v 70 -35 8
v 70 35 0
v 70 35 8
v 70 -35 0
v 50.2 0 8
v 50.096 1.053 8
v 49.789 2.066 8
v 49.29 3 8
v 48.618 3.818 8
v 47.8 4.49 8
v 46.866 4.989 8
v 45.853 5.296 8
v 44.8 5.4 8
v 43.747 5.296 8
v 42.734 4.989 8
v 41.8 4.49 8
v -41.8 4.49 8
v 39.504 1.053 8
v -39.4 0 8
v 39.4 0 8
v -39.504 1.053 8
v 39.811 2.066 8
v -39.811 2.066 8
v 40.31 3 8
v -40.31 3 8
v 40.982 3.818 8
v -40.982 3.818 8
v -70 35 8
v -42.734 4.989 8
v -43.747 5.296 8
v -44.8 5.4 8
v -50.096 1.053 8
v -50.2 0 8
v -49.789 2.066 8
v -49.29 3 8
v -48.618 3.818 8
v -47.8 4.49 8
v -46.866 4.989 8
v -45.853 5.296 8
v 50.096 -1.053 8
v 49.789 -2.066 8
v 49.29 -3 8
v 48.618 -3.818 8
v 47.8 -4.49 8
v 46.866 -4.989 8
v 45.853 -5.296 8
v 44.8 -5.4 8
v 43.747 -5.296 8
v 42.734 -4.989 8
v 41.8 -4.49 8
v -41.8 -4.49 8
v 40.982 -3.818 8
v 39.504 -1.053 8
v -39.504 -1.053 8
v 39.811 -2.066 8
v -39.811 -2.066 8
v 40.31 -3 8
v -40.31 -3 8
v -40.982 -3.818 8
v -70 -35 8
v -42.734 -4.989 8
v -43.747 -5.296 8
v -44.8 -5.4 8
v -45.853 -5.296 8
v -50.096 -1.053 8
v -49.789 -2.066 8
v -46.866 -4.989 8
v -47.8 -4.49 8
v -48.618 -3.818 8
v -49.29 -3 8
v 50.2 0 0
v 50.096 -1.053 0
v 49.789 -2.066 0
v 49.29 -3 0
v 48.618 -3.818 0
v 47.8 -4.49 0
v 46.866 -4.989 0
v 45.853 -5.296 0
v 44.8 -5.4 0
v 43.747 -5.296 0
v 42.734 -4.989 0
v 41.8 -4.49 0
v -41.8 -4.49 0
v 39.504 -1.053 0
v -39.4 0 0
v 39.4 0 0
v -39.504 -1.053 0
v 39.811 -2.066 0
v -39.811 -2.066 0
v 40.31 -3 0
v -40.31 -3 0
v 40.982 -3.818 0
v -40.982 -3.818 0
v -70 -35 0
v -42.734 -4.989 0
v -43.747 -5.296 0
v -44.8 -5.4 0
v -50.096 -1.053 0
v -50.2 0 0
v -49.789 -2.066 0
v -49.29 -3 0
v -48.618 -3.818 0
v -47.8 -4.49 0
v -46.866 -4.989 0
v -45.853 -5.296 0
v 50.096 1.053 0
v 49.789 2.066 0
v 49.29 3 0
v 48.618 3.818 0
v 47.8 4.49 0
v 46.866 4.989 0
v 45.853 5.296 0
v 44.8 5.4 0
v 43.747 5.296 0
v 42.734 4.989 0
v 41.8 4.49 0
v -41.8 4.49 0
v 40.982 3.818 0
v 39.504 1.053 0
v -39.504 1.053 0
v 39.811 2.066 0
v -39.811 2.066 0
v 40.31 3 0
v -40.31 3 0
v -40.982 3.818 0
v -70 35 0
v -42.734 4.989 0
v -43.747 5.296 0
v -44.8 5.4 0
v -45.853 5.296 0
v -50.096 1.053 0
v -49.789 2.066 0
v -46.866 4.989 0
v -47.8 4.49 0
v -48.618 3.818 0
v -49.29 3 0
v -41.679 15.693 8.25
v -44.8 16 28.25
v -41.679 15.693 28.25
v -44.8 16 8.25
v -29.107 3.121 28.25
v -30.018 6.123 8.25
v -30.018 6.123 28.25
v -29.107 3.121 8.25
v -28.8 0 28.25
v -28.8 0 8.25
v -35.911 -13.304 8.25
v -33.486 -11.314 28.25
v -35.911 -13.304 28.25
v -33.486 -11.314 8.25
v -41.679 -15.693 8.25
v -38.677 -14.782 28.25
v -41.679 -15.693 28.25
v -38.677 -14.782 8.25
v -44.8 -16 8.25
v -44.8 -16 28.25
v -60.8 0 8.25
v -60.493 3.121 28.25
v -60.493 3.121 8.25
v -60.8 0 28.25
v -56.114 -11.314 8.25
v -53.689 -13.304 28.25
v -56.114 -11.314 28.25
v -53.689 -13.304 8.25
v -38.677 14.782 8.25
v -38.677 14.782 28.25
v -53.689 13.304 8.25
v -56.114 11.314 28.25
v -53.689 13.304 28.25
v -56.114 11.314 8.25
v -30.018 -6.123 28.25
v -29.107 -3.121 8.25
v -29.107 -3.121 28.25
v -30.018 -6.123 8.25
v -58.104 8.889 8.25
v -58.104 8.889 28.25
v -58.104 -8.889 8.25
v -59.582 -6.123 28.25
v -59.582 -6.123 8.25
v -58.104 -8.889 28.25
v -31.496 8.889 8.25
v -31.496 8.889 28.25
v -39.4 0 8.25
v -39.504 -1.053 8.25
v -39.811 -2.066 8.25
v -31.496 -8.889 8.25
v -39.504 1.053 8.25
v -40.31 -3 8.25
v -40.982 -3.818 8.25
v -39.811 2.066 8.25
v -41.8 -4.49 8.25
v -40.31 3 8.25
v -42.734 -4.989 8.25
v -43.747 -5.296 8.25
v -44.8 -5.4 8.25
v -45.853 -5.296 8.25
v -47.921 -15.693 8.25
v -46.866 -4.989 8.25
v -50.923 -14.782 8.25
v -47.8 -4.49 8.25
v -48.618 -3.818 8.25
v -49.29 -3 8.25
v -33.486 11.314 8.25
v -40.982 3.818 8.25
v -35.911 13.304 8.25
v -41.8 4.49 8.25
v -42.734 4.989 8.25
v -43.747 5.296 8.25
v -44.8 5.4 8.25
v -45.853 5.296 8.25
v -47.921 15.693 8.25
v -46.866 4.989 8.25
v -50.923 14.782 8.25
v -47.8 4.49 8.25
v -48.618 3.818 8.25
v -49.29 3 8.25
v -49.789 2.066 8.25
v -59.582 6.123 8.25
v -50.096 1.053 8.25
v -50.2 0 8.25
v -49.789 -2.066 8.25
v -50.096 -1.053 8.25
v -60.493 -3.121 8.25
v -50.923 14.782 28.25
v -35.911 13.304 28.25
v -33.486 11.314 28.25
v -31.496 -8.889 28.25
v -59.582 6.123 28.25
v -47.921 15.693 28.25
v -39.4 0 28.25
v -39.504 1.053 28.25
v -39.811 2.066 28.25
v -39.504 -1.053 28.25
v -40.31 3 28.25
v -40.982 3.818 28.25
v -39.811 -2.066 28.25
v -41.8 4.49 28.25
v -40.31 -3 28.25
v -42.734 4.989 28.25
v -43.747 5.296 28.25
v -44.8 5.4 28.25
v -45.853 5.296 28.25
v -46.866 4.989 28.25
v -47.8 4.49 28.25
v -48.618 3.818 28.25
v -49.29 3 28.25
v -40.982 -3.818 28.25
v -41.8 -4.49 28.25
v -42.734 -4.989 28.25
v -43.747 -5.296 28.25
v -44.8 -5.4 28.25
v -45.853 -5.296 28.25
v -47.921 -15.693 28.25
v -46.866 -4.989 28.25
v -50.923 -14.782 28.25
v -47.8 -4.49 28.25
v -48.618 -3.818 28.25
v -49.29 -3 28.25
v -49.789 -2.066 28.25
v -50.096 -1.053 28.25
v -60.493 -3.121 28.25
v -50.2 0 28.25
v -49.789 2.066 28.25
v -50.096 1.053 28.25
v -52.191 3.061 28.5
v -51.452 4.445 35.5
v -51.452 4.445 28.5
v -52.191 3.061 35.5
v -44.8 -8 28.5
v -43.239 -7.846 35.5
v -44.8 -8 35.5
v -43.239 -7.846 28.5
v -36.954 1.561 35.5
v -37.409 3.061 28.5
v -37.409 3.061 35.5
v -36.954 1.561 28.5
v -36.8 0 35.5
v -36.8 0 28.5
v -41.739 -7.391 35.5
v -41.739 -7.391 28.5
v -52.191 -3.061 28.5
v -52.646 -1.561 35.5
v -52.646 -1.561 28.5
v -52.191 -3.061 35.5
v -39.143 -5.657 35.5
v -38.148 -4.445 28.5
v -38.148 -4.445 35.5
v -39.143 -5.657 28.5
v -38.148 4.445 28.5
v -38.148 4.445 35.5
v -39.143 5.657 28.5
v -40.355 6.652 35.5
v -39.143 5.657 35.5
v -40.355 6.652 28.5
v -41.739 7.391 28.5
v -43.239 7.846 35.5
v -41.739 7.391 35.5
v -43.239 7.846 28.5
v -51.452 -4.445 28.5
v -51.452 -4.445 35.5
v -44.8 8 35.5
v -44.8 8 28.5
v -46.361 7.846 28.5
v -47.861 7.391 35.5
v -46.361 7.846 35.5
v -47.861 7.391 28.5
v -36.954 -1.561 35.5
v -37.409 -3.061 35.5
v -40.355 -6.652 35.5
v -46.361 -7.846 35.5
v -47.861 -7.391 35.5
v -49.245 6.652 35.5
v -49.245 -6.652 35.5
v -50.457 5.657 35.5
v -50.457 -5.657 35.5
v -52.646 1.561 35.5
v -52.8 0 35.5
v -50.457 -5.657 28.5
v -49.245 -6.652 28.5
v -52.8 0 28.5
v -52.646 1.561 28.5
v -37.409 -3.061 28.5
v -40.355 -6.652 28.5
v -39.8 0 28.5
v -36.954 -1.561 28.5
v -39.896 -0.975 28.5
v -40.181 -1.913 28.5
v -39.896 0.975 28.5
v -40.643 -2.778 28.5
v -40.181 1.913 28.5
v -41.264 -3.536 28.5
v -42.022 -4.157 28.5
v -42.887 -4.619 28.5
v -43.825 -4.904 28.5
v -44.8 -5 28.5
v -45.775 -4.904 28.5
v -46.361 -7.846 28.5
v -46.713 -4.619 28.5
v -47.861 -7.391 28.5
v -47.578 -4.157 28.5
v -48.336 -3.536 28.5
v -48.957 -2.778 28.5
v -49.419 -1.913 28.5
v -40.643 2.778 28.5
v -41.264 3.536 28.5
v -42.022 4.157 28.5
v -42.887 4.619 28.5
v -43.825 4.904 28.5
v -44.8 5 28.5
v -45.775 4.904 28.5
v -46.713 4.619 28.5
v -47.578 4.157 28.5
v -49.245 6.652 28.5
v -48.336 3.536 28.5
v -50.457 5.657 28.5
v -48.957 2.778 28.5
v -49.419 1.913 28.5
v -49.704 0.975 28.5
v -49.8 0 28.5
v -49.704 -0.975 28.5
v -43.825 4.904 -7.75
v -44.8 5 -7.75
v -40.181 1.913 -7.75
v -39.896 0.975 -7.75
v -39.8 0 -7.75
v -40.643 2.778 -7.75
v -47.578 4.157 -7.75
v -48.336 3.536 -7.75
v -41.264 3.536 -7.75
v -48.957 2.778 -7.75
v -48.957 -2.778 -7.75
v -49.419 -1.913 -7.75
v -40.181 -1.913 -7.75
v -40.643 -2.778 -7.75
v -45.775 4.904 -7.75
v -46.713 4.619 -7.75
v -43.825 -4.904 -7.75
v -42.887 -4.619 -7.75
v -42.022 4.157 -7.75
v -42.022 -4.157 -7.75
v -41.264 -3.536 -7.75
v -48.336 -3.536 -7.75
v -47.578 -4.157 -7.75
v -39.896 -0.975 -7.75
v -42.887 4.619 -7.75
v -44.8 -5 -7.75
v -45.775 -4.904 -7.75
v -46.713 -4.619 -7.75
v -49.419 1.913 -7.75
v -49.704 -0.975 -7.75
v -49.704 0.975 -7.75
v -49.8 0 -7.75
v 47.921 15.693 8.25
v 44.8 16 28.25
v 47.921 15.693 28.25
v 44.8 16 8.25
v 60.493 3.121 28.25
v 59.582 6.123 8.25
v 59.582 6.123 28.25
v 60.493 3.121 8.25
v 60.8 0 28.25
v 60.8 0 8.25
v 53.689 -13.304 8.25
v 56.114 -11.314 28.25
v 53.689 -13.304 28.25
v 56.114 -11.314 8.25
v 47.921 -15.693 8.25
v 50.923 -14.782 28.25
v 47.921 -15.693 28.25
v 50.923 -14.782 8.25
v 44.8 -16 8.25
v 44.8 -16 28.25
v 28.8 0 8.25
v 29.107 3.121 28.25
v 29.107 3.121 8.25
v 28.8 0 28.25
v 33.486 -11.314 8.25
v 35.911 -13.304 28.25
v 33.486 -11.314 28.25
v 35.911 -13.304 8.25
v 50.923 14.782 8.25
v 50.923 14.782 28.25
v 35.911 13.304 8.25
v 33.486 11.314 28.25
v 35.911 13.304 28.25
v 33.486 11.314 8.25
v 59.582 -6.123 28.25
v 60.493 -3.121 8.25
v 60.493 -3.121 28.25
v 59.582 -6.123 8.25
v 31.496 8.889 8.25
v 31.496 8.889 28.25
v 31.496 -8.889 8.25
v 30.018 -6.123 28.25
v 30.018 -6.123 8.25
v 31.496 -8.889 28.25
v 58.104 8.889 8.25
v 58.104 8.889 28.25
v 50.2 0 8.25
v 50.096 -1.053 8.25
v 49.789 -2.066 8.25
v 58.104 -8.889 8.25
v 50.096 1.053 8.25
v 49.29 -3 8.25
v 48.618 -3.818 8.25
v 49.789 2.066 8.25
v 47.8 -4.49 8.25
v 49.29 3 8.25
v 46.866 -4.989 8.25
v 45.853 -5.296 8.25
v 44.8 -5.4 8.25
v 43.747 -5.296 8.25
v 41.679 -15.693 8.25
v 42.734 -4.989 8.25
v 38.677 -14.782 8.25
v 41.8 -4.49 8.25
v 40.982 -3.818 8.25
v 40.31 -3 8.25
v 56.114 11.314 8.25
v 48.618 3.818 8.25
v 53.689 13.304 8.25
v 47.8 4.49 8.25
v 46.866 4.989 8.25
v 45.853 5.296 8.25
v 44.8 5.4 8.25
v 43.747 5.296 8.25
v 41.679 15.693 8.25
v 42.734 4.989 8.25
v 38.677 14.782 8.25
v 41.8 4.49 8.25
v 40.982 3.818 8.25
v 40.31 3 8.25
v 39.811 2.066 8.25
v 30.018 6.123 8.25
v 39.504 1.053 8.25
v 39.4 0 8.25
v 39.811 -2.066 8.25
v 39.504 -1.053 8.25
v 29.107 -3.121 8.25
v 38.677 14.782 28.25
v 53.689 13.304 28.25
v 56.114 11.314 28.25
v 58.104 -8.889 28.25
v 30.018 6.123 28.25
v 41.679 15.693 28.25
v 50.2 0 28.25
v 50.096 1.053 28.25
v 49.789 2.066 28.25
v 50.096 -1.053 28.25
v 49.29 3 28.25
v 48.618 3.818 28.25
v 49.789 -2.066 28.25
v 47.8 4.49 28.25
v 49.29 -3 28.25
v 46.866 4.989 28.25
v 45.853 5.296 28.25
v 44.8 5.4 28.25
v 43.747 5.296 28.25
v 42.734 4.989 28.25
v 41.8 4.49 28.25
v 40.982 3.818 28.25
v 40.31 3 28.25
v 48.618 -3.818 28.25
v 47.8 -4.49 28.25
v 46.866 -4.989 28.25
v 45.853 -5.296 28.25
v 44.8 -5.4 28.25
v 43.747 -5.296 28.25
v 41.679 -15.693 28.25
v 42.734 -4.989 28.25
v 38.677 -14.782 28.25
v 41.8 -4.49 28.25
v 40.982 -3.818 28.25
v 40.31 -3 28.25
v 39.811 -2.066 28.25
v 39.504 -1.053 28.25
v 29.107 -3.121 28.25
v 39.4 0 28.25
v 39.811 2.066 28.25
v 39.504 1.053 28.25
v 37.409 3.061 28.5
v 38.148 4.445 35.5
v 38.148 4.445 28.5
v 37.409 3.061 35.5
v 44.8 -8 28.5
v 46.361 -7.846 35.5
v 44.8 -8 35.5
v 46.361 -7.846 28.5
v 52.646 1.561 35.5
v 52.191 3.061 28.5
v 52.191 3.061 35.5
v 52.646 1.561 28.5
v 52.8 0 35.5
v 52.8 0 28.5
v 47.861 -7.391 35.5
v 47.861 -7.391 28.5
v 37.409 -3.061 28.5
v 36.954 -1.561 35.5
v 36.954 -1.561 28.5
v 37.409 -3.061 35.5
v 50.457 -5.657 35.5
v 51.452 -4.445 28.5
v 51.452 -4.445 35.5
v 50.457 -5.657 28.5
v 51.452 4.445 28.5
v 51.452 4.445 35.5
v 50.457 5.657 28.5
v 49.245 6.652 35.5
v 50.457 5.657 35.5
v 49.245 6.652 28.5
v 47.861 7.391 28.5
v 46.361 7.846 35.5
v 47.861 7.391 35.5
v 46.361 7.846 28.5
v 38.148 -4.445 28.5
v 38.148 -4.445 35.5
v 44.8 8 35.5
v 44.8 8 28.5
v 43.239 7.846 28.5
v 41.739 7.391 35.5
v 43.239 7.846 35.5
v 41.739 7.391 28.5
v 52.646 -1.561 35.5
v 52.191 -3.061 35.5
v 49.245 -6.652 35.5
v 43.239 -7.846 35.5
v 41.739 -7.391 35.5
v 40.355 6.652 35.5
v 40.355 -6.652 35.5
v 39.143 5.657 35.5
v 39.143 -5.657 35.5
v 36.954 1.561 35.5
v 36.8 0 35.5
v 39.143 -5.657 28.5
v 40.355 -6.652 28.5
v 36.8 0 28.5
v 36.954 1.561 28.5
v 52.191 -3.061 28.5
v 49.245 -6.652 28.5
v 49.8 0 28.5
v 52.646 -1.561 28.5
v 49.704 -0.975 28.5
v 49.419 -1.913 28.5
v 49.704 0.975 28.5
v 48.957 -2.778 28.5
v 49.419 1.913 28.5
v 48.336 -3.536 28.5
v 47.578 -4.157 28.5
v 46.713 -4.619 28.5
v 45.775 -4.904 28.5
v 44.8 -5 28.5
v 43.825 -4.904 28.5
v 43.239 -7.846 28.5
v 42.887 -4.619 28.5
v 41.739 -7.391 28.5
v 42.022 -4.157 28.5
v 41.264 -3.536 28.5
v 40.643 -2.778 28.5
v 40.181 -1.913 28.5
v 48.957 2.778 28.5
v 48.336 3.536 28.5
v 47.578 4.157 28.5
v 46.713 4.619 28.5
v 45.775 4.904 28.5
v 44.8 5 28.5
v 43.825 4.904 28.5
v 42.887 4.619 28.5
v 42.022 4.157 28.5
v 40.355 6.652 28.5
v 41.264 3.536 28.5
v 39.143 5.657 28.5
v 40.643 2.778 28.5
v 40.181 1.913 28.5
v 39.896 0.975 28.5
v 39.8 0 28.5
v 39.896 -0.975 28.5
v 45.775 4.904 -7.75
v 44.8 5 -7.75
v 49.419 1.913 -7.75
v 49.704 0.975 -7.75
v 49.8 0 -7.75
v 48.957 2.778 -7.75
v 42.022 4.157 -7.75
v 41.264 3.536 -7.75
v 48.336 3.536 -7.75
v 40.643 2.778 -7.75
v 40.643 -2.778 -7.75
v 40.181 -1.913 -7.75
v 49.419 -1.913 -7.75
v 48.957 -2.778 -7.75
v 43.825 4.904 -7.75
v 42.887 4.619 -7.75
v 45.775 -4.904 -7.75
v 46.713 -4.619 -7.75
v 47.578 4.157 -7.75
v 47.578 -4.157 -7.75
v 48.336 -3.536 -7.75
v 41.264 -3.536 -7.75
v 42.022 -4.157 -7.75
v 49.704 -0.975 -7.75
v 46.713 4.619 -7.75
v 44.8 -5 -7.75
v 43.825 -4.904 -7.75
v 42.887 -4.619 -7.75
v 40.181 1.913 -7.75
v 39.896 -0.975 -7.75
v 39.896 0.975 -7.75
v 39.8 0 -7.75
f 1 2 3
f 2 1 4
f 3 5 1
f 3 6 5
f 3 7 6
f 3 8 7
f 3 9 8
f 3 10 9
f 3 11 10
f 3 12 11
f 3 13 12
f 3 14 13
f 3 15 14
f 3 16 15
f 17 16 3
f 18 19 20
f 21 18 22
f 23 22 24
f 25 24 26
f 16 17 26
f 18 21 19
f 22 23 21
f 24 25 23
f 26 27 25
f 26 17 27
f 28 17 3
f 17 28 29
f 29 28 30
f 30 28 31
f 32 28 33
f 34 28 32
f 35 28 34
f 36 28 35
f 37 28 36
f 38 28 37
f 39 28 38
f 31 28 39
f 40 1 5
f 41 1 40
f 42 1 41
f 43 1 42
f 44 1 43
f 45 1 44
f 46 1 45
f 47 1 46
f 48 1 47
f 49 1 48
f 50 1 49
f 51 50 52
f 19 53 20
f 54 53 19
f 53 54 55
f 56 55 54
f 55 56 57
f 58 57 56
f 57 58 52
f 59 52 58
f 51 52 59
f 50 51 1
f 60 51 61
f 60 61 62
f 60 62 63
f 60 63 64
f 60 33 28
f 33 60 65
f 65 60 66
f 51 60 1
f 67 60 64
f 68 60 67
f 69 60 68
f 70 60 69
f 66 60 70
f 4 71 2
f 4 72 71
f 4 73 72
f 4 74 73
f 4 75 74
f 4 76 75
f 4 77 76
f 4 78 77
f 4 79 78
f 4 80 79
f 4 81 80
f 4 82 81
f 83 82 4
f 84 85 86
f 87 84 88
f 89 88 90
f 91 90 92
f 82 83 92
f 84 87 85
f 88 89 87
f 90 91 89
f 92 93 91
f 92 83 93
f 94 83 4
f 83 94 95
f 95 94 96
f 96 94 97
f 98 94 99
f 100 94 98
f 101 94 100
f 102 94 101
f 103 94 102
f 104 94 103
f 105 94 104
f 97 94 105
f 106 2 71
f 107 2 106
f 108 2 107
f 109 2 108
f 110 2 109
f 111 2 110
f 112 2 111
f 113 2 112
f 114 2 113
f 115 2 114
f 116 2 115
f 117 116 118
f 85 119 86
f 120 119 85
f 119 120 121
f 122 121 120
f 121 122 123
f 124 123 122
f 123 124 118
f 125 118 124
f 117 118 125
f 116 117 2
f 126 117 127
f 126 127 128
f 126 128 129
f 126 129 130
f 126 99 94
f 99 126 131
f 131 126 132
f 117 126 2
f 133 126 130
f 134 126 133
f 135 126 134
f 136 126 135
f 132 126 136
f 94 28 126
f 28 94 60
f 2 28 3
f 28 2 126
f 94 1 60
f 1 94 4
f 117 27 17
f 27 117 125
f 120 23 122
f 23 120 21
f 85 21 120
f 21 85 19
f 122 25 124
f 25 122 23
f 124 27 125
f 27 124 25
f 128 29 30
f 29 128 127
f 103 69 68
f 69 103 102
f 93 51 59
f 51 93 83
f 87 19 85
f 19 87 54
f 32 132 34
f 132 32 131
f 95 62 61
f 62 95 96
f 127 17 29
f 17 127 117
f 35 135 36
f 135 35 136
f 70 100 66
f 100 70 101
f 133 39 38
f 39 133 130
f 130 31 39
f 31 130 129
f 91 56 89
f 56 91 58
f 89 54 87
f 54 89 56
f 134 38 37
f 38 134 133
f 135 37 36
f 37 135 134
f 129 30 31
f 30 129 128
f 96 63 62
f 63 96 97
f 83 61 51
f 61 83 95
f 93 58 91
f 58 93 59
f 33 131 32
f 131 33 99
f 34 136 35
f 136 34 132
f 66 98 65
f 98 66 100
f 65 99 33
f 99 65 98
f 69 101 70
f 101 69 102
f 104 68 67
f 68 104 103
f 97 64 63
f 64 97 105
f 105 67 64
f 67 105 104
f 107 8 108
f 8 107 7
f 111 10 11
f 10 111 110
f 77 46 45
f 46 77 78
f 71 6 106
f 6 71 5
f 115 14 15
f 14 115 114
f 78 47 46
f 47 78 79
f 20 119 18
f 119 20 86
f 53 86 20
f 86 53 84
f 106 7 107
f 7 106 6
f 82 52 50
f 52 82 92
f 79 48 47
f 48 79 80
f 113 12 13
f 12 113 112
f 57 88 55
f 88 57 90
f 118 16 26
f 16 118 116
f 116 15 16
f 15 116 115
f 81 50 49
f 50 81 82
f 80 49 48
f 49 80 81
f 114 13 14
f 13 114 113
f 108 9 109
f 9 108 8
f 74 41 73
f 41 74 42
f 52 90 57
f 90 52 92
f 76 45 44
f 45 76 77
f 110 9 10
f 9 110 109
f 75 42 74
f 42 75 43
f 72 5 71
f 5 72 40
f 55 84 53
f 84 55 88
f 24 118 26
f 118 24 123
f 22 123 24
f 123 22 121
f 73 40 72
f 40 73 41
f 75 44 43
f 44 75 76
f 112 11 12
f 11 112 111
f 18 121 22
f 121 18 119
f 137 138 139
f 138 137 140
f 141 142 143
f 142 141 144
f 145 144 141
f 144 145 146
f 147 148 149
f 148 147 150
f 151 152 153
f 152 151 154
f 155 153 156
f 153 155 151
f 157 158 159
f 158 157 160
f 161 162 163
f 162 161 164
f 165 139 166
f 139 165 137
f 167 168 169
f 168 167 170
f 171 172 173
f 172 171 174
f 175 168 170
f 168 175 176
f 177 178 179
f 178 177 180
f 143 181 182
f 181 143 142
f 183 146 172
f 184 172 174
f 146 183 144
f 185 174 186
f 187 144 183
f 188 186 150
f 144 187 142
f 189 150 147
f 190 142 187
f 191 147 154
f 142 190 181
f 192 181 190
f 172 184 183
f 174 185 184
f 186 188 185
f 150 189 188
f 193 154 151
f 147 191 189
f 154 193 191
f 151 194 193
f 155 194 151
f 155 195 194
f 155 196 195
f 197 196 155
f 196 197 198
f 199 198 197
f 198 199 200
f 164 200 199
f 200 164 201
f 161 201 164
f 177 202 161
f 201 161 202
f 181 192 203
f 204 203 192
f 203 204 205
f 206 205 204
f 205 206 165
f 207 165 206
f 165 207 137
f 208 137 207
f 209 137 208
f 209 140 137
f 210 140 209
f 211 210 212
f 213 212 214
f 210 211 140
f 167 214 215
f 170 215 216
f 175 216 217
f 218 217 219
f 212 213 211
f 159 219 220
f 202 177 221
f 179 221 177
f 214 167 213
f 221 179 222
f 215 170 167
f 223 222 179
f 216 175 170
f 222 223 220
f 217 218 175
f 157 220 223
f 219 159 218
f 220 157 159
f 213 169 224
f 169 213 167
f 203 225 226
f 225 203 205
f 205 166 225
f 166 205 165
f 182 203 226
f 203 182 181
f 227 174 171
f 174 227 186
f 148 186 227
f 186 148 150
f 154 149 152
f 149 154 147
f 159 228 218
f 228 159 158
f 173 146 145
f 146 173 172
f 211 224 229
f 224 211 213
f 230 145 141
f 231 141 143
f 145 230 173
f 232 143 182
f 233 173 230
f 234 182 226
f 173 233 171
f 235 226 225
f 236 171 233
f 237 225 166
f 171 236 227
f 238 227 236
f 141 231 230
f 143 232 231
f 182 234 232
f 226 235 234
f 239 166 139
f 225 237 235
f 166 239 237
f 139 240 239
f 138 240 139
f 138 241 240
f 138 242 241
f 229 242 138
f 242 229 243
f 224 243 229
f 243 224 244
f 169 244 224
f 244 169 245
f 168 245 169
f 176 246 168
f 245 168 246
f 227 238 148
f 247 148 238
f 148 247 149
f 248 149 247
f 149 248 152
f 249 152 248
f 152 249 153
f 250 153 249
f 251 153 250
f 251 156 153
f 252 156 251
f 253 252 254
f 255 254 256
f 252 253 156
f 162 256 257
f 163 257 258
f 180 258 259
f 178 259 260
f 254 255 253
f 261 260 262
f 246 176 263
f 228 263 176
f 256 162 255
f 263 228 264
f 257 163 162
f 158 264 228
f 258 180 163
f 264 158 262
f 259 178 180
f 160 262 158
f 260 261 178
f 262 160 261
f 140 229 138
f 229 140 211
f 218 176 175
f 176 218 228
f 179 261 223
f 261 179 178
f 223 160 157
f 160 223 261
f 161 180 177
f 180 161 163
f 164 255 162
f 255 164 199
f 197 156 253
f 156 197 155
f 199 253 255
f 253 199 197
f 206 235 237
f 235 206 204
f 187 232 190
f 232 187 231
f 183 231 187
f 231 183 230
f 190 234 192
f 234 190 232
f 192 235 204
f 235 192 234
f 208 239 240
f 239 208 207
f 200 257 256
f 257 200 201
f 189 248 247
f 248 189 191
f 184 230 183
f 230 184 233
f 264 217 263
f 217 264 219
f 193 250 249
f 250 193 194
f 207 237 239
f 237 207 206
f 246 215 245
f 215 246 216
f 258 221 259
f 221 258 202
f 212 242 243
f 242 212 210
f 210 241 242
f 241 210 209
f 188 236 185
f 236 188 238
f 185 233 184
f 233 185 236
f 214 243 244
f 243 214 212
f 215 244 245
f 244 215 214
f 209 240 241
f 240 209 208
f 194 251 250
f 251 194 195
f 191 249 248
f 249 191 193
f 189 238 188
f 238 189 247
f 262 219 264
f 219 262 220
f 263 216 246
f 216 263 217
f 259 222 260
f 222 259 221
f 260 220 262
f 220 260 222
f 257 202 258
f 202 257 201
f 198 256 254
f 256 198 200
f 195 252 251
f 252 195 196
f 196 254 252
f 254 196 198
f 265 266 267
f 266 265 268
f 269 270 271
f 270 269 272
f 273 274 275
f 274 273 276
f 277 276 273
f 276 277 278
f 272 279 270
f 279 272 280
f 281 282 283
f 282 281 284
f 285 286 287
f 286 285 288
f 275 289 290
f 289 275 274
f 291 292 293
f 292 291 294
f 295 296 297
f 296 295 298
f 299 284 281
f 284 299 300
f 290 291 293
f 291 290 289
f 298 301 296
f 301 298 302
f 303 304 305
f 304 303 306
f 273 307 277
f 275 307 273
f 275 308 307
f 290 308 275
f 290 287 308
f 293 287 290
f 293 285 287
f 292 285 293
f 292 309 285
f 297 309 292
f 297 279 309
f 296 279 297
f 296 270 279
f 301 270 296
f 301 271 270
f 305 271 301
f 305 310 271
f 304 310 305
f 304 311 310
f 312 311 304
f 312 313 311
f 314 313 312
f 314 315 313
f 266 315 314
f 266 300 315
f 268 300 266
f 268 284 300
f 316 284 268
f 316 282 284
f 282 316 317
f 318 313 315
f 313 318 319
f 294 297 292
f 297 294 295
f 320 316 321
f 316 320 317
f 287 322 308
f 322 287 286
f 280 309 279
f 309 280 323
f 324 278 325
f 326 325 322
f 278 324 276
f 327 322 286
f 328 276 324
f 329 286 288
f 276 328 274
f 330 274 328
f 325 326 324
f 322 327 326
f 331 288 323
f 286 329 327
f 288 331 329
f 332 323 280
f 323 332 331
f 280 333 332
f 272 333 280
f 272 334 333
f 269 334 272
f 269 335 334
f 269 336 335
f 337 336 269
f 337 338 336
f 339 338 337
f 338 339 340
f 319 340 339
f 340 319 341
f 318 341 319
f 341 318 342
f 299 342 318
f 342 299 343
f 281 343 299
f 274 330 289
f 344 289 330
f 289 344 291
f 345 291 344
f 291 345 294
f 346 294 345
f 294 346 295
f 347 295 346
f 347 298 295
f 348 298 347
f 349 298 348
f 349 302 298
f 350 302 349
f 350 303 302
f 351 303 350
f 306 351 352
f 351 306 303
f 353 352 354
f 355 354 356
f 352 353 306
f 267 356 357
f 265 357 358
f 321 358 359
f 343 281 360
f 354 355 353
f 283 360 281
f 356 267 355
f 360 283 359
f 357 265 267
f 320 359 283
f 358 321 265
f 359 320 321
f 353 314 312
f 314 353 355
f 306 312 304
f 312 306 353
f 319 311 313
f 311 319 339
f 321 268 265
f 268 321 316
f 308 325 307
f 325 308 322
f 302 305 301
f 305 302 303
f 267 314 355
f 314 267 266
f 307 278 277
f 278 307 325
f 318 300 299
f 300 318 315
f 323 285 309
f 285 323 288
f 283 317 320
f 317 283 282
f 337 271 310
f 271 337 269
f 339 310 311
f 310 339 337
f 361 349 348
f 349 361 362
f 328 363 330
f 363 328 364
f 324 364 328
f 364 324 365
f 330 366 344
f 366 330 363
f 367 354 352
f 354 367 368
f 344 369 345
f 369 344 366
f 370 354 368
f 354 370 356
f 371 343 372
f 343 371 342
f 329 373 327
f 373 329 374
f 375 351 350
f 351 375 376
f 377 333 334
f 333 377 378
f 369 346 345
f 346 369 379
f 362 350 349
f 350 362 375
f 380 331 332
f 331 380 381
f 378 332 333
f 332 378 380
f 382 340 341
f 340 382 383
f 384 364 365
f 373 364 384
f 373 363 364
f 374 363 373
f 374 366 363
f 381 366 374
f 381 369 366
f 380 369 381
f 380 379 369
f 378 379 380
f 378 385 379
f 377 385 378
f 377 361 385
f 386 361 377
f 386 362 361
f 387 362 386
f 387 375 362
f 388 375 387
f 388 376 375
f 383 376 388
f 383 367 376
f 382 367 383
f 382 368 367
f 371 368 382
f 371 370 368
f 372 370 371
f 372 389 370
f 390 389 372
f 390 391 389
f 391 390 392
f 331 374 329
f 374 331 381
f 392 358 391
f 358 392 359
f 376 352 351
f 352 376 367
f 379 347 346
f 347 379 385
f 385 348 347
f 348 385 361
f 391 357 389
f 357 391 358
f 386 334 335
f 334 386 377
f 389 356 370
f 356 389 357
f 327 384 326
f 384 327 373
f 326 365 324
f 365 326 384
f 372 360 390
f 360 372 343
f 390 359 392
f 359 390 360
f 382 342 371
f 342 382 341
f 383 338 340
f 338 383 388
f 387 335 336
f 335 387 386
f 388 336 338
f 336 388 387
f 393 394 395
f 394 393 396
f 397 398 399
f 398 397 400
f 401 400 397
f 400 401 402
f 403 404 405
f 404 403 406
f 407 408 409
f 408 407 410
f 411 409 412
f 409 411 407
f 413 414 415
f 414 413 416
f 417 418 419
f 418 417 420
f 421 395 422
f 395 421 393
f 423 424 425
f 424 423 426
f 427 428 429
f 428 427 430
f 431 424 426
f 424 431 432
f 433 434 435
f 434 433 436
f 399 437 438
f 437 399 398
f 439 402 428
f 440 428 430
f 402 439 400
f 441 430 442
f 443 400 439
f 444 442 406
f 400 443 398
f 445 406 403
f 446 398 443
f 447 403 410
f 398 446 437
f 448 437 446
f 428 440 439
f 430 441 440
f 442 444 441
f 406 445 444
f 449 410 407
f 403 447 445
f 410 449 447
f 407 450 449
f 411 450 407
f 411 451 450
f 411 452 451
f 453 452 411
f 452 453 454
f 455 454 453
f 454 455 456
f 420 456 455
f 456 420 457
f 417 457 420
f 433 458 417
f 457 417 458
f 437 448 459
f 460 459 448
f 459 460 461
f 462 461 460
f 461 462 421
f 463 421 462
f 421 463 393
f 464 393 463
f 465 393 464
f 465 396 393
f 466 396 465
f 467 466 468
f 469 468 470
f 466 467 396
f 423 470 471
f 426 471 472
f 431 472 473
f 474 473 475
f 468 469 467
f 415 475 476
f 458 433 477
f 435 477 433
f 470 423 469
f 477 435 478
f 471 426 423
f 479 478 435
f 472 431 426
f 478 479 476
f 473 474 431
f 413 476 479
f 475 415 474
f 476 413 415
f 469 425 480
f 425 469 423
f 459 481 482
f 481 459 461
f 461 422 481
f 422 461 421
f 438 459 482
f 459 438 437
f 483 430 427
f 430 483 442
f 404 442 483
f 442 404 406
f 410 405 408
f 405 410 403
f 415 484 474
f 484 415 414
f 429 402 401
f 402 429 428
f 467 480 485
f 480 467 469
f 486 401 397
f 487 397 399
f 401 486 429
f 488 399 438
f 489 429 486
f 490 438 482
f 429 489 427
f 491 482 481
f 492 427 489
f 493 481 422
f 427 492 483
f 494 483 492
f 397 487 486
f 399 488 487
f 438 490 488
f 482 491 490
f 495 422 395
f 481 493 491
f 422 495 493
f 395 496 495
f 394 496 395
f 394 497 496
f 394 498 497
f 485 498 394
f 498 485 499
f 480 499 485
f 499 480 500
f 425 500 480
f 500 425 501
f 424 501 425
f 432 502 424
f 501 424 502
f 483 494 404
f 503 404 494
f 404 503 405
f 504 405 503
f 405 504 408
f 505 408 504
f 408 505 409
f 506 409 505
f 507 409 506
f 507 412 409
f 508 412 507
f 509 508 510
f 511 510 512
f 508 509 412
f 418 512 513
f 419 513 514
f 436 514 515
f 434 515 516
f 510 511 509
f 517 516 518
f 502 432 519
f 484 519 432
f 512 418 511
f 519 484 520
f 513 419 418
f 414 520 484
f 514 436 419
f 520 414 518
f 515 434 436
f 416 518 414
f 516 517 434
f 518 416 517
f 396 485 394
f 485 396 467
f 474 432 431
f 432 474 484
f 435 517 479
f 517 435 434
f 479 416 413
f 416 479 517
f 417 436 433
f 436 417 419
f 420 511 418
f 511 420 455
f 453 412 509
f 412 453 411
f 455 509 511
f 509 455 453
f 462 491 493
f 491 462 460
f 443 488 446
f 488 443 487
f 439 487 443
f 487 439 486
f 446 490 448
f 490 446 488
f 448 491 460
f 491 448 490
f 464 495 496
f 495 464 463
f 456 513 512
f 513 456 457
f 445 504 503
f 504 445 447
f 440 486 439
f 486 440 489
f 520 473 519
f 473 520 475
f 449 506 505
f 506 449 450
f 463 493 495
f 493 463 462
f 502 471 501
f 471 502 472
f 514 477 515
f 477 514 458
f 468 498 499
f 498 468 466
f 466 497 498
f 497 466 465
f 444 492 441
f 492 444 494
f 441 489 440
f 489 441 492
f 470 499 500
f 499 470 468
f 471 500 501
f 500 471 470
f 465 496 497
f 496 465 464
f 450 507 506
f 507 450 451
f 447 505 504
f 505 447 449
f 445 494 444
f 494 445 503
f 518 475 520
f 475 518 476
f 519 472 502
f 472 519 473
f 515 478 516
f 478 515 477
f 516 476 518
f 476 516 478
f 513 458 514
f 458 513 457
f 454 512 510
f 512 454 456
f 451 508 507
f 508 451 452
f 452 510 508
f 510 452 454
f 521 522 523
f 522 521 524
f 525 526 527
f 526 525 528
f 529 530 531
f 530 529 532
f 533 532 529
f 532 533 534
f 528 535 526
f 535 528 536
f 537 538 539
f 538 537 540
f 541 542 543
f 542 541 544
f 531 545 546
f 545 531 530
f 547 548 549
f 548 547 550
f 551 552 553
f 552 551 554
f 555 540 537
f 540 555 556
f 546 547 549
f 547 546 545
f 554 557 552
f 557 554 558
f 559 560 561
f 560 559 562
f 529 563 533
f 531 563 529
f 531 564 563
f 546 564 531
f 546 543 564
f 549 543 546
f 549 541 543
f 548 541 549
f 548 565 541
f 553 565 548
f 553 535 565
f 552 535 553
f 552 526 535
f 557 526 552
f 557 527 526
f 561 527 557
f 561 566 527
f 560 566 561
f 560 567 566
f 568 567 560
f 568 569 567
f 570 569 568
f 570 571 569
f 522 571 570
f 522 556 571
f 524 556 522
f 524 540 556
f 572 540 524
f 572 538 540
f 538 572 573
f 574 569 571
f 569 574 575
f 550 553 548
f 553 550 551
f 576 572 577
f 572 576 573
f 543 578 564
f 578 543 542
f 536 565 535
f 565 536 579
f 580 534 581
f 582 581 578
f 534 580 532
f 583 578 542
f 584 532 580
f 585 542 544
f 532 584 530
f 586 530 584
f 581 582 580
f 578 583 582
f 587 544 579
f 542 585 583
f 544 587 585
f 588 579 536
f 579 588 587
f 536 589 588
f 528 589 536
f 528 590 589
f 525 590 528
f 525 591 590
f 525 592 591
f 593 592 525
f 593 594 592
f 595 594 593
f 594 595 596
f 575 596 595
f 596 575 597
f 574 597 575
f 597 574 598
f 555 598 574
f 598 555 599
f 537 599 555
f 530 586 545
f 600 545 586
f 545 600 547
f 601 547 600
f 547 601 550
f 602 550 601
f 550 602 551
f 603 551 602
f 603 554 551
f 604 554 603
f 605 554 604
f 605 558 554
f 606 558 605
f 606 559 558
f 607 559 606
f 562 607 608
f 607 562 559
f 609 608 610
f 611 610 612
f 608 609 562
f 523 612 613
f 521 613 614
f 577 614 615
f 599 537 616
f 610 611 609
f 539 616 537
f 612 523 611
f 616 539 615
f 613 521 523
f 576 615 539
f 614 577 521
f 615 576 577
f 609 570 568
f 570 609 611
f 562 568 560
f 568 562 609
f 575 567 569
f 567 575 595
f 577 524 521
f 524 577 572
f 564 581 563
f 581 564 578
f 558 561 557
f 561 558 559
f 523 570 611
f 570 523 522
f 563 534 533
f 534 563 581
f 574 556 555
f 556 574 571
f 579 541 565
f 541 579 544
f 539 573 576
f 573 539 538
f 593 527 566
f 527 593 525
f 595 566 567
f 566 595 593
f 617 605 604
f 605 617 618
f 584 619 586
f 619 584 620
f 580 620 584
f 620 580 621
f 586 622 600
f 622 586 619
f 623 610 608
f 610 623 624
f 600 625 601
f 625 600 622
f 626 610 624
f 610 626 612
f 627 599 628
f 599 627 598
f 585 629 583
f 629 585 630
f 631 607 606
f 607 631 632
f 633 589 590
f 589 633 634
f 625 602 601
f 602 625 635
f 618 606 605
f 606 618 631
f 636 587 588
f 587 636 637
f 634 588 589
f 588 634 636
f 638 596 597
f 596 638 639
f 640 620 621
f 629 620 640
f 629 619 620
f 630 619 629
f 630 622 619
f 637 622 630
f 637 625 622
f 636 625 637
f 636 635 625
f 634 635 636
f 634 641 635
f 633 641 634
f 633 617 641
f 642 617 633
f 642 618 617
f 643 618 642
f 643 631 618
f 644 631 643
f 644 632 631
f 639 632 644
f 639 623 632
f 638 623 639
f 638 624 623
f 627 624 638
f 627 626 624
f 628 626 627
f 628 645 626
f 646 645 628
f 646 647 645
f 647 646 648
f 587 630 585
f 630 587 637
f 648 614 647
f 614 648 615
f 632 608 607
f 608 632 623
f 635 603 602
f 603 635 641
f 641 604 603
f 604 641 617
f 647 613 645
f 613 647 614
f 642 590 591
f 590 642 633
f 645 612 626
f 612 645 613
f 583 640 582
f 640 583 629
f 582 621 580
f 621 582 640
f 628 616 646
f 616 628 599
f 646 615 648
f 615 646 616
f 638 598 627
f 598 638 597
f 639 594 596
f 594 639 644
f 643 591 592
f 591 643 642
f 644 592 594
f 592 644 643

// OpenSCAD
$fn = 32;

// ------------------------------------------------------------------------
// Standoff columns: 2 d32 standoffs, bolts d10
// Every part is its own module, assembly() places them once.
// ------------------------------------------------------------------------

// --- part 1 ---
module base_plate() {
  difference() {
    translate([-70, -35, 0]) cube([140, 70, 8]);
    translate([-44.8, 0, -1]) cylinder(h = 10, d = 10.8);
    translate([44.8, 0, -1]) cylinder(h = 10, d = 10.8);
  }
}

// --- part 2 ---
module spacer1() {
  difference() {
      translate([0, 0, 0]) cylinder(h = 20, d = 32);
      translate([0, 0, -1]) cylinder(h = 22, d = 10.8);
    }
}

// --- part 3 ---
module bolt1() {
  cylinder(h = 7, d = 16);
  translate([0, 0, -36.25]) cylinder(h = 36.25, d = 10);
}

// --- part 4 ---
module spacer2() {
  difference() {
      translate([0, 0, 0]) cylinder(h = 20, d = 32);
      translate([0, 0, -1]) cylinder(h = 22, d = 10.8);
    }
}

// --- part 5 ---
module bolt2() {
  cylinder(h = 7, d = 16);
  translate([0, 0, -36.25]) cylinder(h = 36.25, d = 10);
}

// --- assembly ---
module assembly() {
  translate([0, 0, 0]) rotate([0, 0, 0]) base_plate();
  translate([-44.8, 0, 8.25]) rotate([0, 0, 0]) spacer1();
  translate([-44.8, 0, 28.5]) rotate([0, 0, 0]) bolt1();
  translate([44.8, 0, 8.25]) rotate([0, 0, 0]) spacer2();
  translate([44.8, 0, 28.5]) rotate([0, 0, 0]) bolt2();
}

assembly();
